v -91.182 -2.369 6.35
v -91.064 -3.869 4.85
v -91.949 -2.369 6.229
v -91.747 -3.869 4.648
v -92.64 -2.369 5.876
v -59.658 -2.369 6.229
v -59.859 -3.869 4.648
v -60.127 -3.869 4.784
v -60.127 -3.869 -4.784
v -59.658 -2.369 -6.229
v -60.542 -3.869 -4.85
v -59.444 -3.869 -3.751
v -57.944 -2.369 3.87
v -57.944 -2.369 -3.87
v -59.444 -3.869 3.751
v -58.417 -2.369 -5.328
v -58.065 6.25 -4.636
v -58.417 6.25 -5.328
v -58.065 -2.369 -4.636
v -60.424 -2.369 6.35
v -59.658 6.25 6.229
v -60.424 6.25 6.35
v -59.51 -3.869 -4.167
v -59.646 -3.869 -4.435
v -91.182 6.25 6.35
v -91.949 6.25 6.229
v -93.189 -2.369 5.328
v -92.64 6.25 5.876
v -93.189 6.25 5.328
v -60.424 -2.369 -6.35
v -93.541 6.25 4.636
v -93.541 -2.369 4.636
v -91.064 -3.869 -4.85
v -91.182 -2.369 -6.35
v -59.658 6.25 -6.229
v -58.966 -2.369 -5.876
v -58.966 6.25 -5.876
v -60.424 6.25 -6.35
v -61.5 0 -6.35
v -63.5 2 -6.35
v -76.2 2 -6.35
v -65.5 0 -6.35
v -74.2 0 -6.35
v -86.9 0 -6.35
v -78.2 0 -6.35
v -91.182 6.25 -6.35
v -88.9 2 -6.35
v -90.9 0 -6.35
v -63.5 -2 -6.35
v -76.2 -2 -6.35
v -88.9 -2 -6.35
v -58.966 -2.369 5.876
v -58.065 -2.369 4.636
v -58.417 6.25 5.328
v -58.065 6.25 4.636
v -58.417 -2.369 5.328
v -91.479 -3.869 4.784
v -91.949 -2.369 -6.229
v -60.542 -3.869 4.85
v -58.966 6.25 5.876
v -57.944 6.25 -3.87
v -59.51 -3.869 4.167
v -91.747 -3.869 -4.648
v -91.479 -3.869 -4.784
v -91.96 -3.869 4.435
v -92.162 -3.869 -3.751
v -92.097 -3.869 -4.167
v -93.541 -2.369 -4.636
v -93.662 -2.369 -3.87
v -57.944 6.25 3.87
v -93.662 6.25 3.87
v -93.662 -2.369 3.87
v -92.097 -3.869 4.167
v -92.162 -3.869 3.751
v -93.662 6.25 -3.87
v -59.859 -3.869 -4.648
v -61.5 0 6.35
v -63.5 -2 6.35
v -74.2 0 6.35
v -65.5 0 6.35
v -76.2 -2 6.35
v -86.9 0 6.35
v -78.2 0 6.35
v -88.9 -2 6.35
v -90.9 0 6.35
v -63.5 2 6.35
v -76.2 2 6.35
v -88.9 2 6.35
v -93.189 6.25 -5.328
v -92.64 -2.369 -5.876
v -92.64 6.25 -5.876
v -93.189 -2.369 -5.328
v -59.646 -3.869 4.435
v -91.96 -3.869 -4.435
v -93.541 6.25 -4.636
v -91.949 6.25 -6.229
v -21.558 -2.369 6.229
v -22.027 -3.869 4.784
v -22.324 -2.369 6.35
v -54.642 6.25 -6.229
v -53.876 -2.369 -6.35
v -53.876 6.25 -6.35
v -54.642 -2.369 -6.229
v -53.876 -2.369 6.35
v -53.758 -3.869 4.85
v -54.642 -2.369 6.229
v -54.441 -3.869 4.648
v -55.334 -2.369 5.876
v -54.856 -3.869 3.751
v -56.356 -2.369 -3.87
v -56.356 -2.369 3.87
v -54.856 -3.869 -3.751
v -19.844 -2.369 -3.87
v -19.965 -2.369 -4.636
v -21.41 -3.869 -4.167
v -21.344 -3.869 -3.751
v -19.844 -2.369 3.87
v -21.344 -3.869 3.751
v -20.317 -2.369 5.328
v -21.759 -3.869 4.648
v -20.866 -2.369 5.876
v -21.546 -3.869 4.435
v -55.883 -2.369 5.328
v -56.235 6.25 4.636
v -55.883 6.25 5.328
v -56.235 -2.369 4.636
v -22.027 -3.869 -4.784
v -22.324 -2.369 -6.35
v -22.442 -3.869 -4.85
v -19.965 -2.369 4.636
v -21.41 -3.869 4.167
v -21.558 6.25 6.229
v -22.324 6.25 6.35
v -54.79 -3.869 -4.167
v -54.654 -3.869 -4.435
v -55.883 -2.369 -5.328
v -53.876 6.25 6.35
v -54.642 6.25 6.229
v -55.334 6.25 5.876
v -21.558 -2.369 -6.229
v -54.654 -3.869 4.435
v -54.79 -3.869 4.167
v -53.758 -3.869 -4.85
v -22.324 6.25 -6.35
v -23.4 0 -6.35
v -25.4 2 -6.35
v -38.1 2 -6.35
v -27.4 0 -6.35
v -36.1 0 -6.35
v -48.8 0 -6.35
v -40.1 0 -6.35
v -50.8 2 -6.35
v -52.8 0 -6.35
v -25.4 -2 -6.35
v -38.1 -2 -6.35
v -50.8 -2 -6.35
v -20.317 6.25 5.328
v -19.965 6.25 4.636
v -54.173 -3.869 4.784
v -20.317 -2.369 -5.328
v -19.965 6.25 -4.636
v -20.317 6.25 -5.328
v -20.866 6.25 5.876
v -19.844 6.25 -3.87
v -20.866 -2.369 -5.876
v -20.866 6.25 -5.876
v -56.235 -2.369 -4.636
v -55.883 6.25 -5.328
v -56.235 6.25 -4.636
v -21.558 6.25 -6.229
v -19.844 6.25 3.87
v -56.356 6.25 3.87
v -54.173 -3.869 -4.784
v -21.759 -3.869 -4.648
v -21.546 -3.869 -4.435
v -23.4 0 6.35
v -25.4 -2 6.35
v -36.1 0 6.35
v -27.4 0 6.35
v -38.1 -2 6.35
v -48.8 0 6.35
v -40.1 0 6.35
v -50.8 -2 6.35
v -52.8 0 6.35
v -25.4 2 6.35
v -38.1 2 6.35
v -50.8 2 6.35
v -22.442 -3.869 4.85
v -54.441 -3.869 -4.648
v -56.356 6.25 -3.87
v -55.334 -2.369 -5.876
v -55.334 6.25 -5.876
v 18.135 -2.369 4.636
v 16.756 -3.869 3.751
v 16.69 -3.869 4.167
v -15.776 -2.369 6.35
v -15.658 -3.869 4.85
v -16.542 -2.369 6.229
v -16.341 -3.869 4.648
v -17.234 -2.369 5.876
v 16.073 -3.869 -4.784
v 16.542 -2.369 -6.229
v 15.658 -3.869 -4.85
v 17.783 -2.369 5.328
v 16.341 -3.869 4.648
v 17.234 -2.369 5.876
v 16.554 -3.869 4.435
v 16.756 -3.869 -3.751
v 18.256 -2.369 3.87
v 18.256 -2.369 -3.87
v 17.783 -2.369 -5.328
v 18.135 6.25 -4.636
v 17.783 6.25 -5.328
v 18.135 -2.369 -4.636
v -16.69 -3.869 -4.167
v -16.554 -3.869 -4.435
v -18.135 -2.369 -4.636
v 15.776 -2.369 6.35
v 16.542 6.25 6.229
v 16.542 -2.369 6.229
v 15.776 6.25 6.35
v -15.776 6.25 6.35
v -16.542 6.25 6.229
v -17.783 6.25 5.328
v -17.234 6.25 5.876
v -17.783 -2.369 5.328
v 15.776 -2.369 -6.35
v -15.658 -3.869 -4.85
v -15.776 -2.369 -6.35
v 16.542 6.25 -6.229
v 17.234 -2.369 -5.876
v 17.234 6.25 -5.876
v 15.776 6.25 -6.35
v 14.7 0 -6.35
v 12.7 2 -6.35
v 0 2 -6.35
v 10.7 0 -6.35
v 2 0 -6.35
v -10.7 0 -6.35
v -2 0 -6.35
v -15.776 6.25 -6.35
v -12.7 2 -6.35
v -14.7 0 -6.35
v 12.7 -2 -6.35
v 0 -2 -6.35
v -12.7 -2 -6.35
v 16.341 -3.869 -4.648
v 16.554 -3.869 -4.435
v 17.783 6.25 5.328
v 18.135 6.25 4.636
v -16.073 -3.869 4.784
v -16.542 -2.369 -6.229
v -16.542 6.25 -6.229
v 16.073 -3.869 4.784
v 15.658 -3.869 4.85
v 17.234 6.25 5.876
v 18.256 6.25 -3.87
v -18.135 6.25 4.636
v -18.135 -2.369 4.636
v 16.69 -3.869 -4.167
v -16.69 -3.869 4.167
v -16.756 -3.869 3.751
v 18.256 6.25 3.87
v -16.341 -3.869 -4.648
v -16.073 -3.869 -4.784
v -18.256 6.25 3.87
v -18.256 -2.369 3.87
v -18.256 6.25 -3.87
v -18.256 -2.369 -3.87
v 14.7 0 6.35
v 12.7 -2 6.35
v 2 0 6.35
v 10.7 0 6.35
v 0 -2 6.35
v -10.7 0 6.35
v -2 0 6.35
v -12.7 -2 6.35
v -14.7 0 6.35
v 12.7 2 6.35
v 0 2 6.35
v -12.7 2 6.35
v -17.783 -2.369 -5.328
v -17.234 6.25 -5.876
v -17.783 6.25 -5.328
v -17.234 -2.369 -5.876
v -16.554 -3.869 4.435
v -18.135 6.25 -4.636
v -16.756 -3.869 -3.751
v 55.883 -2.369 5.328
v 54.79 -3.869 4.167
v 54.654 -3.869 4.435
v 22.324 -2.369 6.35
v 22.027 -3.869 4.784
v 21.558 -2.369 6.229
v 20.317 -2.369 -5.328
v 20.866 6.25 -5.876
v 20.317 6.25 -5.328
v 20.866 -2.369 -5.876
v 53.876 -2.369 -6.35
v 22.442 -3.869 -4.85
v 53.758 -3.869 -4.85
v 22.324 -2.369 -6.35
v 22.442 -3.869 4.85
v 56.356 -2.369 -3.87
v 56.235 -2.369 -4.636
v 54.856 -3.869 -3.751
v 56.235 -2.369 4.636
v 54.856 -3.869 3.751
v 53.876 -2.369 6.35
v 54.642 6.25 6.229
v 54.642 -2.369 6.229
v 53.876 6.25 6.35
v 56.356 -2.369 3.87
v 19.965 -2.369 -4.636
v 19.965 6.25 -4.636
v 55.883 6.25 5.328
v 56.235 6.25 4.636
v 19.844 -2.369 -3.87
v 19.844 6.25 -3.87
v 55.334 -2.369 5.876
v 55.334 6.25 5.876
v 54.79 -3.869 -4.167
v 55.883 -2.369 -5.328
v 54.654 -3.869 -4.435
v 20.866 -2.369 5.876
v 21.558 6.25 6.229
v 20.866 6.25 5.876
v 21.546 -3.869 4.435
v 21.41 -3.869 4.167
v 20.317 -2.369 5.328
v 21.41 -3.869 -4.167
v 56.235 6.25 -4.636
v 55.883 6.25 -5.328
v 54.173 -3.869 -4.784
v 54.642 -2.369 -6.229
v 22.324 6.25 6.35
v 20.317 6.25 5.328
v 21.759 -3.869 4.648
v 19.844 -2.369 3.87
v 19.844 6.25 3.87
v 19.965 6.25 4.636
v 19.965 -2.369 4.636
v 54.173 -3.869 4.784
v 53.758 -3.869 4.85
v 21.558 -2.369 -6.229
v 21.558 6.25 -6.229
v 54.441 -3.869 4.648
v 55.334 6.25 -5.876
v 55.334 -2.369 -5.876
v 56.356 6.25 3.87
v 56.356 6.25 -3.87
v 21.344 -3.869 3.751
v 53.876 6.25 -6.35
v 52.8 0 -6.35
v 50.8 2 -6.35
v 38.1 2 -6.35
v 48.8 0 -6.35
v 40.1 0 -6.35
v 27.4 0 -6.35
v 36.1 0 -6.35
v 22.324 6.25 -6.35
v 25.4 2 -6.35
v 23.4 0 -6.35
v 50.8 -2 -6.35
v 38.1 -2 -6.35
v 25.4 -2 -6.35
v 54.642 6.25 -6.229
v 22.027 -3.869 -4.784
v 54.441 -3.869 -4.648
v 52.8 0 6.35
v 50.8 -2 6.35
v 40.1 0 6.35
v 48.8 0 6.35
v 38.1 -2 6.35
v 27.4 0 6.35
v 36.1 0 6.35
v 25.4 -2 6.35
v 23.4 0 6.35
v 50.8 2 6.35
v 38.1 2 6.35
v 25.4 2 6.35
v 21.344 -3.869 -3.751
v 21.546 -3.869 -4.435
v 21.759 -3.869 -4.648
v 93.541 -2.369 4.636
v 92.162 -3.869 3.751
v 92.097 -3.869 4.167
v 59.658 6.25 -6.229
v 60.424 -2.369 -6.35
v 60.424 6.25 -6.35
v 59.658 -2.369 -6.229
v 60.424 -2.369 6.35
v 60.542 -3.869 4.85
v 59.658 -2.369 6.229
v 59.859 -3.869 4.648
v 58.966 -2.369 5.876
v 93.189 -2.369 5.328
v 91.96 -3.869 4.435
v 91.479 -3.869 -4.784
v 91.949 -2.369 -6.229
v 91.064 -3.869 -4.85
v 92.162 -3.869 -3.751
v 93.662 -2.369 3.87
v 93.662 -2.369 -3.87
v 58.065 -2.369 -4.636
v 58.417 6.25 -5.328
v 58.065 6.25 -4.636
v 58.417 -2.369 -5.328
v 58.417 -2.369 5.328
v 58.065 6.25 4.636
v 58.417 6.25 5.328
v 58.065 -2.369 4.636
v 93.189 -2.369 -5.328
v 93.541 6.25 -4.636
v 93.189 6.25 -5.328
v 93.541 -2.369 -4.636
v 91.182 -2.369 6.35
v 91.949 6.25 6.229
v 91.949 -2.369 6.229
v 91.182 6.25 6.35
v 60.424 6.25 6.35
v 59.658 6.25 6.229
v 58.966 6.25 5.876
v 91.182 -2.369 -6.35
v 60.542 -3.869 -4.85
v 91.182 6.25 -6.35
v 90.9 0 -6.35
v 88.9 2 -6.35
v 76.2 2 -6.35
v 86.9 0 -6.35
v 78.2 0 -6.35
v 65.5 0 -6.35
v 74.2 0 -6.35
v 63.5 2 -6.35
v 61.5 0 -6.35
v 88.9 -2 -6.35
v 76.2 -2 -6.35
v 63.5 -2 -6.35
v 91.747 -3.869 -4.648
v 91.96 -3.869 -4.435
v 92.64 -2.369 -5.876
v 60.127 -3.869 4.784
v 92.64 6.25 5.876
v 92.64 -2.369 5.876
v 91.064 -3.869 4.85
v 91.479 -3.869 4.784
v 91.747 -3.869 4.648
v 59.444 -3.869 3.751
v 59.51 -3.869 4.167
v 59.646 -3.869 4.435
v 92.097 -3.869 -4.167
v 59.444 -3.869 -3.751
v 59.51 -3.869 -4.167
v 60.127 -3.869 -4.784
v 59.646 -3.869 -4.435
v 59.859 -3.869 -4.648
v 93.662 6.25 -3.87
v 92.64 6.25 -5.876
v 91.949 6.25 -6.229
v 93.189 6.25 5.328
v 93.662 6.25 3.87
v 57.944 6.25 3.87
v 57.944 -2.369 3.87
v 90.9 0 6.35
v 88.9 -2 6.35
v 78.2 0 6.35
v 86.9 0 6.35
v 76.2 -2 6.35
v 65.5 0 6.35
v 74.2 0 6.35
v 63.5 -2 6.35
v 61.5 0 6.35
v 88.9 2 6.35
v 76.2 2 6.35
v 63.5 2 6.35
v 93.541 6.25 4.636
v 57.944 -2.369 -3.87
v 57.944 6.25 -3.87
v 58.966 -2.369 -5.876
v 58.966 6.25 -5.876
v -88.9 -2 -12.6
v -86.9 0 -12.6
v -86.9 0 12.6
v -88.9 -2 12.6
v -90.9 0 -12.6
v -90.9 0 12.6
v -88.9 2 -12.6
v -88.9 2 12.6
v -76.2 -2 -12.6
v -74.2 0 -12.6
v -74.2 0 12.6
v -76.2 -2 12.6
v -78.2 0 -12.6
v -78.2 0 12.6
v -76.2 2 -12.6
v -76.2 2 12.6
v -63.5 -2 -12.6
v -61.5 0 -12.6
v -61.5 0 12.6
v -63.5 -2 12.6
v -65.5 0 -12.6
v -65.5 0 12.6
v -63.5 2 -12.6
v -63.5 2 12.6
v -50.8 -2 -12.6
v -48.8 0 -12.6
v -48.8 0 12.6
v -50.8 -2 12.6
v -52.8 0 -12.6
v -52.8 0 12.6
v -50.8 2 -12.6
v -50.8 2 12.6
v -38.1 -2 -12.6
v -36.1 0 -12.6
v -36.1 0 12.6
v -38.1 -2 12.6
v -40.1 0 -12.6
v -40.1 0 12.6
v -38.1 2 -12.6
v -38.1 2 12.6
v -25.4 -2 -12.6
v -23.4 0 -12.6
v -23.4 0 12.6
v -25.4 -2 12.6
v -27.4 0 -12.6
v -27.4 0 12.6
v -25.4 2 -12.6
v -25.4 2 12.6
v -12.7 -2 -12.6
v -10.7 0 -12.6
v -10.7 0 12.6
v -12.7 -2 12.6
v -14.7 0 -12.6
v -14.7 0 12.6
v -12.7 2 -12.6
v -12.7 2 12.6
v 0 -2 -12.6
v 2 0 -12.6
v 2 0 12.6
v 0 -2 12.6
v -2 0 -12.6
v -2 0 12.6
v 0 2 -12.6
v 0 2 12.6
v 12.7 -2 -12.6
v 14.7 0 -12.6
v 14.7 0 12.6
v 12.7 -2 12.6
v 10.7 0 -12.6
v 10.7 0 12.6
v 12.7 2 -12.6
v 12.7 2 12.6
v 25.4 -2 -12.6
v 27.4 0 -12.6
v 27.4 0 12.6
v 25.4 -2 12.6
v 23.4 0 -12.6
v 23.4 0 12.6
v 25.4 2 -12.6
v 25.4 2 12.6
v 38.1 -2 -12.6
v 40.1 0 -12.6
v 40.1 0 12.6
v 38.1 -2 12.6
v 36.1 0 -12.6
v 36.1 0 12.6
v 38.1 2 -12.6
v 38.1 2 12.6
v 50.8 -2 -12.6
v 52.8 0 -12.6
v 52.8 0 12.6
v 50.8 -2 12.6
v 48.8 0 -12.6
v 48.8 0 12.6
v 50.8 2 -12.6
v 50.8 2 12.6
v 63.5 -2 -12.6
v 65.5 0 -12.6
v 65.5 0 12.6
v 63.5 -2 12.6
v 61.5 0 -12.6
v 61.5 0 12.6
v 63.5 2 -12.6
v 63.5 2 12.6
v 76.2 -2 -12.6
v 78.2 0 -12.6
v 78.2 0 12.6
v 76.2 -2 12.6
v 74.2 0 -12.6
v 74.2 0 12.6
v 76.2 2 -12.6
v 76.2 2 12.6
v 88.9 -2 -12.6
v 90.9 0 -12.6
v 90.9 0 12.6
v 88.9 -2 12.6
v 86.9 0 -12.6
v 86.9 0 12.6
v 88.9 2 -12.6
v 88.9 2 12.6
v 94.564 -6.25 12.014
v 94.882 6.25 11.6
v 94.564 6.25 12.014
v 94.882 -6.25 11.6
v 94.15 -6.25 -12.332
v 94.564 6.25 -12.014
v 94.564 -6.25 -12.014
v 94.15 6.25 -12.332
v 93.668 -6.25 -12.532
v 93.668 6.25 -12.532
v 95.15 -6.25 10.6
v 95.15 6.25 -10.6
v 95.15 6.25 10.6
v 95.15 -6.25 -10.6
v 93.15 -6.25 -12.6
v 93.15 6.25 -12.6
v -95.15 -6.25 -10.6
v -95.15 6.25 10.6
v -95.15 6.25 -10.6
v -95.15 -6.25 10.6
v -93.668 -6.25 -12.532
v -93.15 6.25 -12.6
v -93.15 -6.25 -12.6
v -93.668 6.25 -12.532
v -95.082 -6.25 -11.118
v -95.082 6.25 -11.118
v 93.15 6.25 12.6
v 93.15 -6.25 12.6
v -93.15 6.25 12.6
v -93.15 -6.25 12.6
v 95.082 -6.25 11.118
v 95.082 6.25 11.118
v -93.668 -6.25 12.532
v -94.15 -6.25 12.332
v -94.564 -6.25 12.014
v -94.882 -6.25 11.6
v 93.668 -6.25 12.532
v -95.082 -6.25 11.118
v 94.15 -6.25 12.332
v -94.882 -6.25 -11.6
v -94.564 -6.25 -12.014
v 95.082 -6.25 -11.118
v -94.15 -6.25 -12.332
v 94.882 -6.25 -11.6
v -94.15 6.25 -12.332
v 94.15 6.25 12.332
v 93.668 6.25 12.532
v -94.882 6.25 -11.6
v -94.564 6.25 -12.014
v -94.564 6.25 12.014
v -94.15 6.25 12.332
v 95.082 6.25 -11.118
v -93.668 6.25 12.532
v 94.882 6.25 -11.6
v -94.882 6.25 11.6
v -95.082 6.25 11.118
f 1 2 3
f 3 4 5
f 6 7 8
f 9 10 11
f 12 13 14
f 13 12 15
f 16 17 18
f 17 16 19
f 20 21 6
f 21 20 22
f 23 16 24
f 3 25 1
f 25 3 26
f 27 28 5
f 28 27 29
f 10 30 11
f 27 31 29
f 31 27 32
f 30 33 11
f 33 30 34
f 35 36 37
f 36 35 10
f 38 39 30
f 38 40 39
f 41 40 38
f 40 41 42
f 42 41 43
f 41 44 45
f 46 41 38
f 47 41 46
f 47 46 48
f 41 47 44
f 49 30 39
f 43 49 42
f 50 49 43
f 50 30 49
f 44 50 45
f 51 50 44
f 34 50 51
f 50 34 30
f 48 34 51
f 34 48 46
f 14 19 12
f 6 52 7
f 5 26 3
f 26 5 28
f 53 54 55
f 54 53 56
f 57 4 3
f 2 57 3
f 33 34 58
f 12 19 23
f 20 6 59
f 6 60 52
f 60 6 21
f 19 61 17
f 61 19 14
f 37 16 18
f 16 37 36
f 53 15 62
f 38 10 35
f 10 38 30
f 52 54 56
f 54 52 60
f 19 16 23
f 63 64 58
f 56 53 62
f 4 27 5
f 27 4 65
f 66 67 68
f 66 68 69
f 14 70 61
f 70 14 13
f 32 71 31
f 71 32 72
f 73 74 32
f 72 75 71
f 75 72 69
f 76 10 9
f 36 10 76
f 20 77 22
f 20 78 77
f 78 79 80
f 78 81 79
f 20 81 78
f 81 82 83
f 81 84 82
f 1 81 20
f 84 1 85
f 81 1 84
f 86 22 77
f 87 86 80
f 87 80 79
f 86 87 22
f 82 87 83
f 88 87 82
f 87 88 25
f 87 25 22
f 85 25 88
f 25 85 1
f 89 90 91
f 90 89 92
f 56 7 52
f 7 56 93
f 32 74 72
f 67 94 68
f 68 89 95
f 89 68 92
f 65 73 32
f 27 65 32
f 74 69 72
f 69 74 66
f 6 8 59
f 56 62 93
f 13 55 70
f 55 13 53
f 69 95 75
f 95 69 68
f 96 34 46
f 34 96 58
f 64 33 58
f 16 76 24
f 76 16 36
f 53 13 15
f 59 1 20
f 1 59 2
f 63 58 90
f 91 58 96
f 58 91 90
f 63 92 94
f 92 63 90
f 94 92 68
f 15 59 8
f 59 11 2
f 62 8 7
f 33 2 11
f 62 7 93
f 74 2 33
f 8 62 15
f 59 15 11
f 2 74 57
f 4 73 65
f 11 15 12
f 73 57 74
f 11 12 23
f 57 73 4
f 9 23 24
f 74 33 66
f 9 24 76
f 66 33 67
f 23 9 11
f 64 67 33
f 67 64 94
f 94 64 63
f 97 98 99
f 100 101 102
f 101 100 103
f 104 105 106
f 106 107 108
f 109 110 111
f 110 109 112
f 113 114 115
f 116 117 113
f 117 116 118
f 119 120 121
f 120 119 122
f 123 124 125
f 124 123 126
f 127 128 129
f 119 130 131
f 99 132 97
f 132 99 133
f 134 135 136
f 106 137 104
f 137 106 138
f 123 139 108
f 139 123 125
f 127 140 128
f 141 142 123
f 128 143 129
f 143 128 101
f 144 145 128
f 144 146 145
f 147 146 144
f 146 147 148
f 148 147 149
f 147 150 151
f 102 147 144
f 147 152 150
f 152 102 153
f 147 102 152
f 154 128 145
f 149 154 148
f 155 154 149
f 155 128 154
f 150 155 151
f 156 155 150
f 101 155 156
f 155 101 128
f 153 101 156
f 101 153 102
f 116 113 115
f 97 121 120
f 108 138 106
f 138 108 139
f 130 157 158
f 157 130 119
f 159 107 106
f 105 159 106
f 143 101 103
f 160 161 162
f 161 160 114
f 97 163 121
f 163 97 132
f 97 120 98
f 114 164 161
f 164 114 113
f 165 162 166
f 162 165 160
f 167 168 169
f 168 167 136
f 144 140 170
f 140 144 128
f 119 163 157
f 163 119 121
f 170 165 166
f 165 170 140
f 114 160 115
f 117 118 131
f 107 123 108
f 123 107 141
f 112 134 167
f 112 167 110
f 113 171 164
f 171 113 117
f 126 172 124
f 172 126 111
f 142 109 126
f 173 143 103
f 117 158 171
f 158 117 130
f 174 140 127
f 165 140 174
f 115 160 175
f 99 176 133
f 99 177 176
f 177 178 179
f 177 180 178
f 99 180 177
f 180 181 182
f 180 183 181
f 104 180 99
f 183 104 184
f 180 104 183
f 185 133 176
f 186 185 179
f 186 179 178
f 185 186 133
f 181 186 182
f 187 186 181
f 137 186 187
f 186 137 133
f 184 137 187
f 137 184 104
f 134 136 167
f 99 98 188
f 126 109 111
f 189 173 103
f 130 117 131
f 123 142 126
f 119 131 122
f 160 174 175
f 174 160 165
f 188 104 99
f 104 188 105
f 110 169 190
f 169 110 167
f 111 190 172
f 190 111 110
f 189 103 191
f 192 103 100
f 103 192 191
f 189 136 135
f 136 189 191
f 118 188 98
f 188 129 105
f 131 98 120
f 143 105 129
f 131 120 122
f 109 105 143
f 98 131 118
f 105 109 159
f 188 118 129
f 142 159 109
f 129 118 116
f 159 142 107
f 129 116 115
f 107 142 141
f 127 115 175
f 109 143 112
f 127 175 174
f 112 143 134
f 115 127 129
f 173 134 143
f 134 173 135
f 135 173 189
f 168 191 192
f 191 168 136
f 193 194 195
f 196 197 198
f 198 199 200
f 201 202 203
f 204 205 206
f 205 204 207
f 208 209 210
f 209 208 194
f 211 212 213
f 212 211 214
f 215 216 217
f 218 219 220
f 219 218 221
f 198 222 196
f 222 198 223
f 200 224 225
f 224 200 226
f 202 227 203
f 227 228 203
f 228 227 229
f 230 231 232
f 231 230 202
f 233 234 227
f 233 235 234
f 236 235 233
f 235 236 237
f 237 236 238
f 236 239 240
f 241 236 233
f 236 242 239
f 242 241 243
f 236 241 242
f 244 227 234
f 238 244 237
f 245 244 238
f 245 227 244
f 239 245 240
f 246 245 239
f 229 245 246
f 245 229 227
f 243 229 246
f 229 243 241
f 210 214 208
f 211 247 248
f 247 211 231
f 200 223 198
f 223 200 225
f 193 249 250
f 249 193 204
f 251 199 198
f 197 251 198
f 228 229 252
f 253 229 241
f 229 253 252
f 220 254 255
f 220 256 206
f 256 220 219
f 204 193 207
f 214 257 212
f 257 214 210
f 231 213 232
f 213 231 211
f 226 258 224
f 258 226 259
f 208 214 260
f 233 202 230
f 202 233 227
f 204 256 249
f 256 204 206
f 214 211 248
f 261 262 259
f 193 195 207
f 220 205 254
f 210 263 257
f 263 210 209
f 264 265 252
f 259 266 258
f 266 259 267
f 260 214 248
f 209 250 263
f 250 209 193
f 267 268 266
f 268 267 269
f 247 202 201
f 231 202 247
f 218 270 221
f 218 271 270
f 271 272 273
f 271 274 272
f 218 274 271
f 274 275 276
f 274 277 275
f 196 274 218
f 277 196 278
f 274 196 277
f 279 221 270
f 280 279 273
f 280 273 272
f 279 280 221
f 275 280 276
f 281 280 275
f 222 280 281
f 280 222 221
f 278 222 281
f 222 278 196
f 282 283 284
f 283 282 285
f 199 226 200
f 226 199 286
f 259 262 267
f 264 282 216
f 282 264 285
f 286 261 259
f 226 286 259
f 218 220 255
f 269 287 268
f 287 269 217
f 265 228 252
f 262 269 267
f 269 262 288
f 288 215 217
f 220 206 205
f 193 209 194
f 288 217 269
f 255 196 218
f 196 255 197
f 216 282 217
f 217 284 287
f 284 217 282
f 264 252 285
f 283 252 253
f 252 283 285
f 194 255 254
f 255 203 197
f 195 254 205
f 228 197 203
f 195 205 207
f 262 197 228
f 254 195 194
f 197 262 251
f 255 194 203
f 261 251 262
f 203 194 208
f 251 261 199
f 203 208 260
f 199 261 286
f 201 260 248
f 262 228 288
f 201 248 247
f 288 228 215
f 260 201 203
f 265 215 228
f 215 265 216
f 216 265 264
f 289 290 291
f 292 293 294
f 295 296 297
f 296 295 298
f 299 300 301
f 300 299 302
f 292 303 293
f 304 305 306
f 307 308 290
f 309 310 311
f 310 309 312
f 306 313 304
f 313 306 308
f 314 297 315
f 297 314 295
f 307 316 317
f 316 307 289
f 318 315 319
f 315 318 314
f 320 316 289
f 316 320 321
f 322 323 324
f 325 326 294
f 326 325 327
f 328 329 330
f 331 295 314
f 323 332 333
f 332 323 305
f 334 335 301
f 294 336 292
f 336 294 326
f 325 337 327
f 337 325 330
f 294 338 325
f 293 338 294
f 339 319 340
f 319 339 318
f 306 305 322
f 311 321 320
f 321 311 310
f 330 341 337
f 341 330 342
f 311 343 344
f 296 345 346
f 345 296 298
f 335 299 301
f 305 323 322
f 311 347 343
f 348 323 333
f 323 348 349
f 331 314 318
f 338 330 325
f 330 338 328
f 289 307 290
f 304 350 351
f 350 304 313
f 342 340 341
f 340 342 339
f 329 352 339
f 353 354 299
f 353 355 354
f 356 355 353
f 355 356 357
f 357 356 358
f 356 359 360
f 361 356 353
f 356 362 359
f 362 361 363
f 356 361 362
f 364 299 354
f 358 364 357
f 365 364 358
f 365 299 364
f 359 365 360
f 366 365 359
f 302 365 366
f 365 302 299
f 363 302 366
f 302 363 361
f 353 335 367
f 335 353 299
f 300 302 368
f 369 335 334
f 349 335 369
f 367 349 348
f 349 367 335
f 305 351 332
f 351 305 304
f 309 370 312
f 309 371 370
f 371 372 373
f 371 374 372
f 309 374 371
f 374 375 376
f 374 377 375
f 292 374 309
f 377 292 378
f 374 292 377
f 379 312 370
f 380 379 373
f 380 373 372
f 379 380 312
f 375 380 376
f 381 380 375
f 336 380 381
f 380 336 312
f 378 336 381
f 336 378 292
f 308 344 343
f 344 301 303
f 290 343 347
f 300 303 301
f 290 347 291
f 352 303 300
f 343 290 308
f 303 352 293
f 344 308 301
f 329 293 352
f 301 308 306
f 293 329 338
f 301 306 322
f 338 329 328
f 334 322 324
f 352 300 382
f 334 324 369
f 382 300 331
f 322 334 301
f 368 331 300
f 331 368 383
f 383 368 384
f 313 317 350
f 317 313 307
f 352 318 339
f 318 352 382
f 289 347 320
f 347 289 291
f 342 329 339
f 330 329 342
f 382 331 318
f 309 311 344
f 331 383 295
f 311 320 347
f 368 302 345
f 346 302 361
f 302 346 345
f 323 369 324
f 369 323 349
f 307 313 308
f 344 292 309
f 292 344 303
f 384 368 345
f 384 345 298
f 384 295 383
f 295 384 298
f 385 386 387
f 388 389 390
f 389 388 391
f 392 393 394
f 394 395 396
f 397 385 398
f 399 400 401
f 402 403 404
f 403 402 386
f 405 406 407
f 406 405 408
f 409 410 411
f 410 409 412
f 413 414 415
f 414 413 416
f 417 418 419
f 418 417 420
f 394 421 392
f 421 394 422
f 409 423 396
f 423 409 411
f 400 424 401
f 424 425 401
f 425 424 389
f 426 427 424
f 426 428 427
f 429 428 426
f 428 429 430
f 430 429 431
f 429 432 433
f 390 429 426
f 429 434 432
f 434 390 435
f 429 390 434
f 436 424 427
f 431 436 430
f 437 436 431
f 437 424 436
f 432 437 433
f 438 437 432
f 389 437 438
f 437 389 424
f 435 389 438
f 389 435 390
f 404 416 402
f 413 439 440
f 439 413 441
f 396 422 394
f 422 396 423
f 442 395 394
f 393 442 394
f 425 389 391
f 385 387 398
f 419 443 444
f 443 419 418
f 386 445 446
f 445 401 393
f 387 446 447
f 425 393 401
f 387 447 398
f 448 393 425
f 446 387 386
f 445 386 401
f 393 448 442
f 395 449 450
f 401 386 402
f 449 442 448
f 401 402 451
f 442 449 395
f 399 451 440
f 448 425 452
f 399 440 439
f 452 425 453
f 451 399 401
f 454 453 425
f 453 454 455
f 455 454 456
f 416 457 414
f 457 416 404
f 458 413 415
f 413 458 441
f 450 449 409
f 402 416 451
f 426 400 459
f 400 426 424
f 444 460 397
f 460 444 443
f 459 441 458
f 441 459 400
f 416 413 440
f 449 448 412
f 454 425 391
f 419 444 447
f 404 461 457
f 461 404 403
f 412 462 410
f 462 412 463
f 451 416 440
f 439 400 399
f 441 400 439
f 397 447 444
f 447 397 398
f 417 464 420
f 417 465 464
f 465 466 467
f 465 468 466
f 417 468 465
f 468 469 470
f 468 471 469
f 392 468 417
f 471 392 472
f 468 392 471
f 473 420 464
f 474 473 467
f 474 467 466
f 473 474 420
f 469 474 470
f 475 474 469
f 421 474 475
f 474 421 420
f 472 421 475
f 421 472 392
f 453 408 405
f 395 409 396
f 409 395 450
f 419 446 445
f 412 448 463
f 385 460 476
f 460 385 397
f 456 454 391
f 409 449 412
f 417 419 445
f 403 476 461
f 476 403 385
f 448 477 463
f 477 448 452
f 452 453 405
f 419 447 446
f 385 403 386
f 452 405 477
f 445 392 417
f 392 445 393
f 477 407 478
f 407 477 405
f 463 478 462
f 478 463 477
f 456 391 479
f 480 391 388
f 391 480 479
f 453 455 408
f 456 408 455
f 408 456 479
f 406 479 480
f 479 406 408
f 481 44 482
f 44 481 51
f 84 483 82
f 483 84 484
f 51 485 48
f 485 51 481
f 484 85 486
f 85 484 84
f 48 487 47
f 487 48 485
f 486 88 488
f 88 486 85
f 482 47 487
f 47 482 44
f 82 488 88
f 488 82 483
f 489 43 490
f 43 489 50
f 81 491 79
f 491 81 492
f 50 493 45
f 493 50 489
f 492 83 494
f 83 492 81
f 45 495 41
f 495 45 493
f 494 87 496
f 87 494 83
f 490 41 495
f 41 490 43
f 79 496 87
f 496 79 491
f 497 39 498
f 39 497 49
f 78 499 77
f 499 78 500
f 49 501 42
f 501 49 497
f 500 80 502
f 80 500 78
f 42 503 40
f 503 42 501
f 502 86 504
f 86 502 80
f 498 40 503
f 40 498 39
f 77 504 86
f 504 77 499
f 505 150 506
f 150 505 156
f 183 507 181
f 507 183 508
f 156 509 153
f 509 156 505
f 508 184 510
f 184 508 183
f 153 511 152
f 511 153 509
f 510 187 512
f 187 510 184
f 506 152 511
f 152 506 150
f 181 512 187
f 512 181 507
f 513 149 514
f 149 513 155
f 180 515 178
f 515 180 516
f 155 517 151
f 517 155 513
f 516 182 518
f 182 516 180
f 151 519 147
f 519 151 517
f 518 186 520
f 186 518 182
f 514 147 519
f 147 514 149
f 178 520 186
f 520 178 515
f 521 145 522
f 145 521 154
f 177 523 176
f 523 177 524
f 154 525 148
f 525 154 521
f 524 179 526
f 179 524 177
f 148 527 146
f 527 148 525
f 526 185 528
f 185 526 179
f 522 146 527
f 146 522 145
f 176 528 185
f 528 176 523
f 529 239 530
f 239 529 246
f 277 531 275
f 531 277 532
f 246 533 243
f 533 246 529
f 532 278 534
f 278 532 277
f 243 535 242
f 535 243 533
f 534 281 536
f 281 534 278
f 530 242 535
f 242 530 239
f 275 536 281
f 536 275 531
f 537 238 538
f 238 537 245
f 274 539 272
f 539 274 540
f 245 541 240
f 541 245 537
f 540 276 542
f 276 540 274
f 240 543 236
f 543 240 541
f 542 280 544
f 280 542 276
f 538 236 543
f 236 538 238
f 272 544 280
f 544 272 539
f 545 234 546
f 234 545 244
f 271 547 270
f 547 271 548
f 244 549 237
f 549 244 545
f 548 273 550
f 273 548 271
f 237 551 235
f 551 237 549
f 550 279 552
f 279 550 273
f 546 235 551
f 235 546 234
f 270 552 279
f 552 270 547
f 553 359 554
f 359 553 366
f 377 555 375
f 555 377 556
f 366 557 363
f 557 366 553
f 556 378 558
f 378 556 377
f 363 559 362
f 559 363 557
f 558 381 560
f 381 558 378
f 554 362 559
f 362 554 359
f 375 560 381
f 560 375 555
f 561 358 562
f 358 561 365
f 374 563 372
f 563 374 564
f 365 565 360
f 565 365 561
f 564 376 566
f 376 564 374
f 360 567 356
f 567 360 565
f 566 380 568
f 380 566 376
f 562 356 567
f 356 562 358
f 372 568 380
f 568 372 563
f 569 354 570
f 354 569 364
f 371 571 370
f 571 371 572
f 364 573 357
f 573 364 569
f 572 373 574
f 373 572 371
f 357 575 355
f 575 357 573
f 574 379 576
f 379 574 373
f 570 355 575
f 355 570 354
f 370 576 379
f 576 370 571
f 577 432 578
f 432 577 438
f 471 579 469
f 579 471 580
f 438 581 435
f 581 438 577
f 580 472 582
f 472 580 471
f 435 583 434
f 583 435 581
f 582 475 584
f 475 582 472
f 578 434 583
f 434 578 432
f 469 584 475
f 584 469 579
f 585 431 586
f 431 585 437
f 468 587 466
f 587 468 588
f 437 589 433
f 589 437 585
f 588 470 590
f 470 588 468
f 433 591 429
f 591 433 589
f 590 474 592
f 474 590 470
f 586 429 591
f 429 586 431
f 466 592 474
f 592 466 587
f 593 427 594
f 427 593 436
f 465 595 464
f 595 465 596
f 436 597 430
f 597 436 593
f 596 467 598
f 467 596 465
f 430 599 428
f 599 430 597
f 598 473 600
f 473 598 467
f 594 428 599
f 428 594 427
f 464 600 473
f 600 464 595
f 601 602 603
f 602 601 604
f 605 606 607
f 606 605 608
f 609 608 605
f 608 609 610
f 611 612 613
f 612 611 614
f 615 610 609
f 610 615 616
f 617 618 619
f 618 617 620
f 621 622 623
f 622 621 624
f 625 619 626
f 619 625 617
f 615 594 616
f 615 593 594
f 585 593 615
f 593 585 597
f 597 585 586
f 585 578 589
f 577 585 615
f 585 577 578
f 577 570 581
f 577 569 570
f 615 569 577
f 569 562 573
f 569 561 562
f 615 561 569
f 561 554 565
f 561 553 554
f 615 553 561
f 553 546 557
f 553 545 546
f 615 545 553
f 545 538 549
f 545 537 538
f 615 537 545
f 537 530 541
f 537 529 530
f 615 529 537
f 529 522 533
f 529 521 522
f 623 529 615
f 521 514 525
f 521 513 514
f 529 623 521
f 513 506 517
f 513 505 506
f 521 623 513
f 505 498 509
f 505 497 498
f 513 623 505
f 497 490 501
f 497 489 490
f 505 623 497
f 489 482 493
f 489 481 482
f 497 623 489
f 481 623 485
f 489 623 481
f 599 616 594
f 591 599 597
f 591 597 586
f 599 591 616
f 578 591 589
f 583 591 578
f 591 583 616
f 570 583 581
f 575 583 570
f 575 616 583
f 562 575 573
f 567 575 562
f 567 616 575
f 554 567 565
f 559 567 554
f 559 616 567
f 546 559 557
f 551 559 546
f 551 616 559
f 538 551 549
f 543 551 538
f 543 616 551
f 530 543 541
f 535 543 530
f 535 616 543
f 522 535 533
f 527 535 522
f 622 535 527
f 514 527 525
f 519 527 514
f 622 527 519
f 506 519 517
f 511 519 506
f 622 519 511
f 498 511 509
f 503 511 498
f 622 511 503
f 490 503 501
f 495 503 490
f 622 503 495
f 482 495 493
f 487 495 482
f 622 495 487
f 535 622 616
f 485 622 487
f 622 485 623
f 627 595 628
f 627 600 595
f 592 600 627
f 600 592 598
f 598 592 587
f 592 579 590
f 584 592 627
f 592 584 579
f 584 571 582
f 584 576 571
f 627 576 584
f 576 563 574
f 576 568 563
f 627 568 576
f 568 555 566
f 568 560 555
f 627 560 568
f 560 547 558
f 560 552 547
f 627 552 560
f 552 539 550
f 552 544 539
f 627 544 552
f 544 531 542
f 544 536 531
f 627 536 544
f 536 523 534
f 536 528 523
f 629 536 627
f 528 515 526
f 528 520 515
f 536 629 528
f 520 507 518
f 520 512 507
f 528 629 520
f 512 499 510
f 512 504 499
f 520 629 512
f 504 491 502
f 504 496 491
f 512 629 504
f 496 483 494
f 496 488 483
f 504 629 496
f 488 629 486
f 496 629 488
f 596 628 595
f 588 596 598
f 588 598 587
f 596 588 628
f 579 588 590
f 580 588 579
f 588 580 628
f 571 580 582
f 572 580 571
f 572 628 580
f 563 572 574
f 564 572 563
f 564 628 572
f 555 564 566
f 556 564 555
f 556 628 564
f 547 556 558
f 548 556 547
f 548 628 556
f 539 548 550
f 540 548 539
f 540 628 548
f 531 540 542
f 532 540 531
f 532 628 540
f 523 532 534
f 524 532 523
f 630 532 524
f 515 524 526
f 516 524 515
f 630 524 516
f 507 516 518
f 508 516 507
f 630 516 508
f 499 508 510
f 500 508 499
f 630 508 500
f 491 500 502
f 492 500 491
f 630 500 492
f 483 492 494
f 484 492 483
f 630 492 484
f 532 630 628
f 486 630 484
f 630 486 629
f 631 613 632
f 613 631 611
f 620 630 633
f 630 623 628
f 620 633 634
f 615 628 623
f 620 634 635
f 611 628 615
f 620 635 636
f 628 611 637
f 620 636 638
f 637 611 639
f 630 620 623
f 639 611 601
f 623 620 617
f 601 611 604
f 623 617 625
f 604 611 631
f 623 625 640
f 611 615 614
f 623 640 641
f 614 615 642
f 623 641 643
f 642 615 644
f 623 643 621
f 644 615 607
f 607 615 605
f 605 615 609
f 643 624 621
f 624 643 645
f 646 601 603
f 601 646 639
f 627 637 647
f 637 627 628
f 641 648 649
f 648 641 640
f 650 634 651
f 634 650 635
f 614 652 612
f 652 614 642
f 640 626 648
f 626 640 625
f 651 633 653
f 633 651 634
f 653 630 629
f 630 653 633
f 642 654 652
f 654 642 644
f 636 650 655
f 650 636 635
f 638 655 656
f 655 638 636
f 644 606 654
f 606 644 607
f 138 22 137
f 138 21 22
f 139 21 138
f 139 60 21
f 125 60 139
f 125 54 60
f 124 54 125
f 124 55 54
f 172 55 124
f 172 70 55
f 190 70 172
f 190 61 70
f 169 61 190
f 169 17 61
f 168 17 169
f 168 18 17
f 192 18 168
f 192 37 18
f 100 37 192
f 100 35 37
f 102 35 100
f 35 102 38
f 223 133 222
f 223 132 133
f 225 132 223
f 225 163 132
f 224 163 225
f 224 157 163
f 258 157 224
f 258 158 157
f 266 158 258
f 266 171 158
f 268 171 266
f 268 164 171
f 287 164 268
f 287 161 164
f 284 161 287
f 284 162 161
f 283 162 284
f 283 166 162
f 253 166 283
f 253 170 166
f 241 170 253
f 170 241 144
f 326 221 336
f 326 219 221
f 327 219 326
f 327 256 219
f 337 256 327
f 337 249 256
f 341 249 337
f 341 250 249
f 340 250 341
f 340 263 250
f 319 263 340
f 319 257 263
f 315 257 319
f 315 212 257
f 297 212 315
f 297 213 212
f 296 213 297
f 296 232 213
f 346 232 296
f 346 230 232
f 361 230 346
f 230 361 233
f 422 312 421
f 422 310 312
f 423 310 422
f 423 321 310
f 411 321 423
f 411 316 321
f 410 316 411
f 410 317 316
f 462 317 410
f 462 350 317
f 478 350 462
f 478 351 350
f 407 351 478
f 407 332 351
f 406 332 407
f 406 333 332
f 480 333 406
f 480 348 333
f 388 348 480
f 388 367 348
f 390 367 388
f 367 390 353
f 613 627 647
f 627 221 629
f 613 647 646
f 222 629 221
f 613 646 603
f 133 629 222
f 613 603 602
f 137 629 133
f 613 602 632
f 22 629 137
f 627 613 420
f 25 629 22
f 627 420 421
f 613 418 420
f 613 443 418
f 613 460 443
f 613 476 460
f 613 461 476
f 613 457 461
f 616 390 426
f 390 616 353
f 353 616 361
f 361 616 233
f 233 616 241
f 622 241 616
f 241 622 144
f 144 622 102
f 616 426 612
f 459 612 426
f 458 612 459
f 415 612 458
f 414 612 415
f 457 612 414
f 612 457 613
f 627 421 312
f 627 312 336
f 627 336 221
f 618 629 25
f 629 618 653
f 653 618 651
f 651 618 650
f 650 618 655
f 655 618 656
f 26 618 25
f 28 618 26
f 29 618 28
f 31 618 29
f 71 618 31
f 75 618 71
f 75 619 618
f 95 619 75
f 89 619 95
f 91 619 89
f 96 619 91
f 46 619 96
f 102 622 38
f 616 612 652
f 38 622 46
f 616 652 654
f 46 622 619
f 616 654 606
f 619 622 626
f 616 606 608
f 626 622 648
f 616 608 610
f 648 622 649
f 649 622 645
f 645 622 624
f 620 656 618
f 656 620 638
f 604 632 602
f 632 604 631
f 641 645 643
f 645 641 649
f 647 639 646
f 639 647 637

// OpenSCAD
// HollowRail0.3
// 
// v0.2
// - Skip generating cavity when appropriate
// - Make diamond holes a little smaller, 4mm instead of 4.5mm
// v0.3:
// - back_y, front_y now configurable, so you can make narrower (or thicker) rails
// - Multiple rounded cutouts instead of one big sharp-cornered one

length = "15atom";
height = "1inch";
// Offset to apply to outer surfaces, usually a small negative value to provide 'wiggle room'
$tgx11_offset = -0.1;
back_y = "-1/4inch";
front_y = "1/4inch";
top_thickness = "1/4inch";
bottom_thickness = "1/4inch";
back_thickness = "3/32inch";
end_thickness = "1u";
$fn = 24;

module hollowrail0__end_params() { }

use <../lib/TOGMod1.scad>
use <../lib/TOGMod1Constructors.scad>
use <../lib/TOGPath1.scad>
use <../lib/TOGPolyhedronLib1.scad>
use <../lib/TOGUnits1.scad>

length_atoms = togunits1_decode(length, [1, "atom"]);
length_mm = togunits1_to_mm(length);
height_mm = togunits1_to_mm(height);
back_thickness_mm  = togunits1_to_mm(back_thickness);
top_thickness_mm  = togunits1_to_mm(top_thickness);
bottom_thickness_mm  = togunits1_to_mm(bottom_thickness);
end_thickness_mm  = togunits1_to_mm(end_thickness);
atom_mm = togunits1_to_mm([1, "atom"]);
back_y_mm  = togunits1_to_mm(back_y);
front_y_mm = togunits1_to_mm(front_y);

length_chunks = round(length_atoms/3);

hole = togmod1_linear_extrude_z([-height_mm, height_mm], togmod1_make_circle(d=4, $fn=4));

togmod1_domodule(["difference",
	togmod1_linear_extrude_y([back_y_mm-$tgx11_offset, front_y_mm+$tgx11_offset], togmod1_make_rounded_rect([length_mm+$tgx11_offset*2, height_mm+$tgx11_offset*2], r=2)),
	
	// 'hollow' bits
	if( back_thickness_mm < (front_y_mm-back_y_mm) && height_mm - top_thickness_mm - bottom_thickness_mm > 0 )
	for( xm=[-length_atoms/2 + 1.5 : 3 : length_atoms/2+1.5] )
	let( cx0 = max(-length_mm/2 + end_thickness_mm, (xm-1.5)*atom_mm + end_thickness_mm/2) )
	let( cx1 = min( length_mm/2 - end_thickness_mm, (xm+1.5)*atom_mm - end_thickness_mm/2) )
	if( cx1 > cx0 )
	let( cy0 = back_y_mm - $tgx11_offset + back_thickness_mm, cy1 = max(cy0+10, front_y_mm + $tgx11_offset + 1) )
	echo( cy0=cy0, cy1=cy1 )
	let( cz0 = -height_mm/2 + bottom_thickness_mm, cz1 = height_mm/2 - top_thickness_mm )
	let( corner_r = min(5, cx1-cx0, cz1-cz0)*127/256 )
	let( korner_r = min(corner_r, 1.5) )
	["rotate", [-90,0,0], tphl1_make_polyhedron_from_layer_function(
		[
			[cy0         ,-korner_r],
			[cy0+korner_r, 0       ],
			[cy1         , 0       ],
		],
		function(yo)
		   togpath1_rath_to_polypoints(["togpath1-rath",
				// Note that winding order looks backwards when extruding along Y
				["togpath1-rathnode", [cx1,cz0], ["round", corner_r], ["offset", yo[1]]],
				["togpath1-rathnode", [cx1,cz1], ["round", corner_r], ["offset", yo[1]]],
				["togpath1-rathnode", [cx0,cz1], ["round", corner_r], ["offset", yo[1]]],
				["togpath1-rathnode", [cx0,cz0], ["round", corner_r], ["offset", yo[1]]],
			]),
		layer_points_transform = "key0-to-z"
	)],
	/*
	// Old cavity generation as used by p2175
	togmod1_linear_extrude_x([-length_mm/2+end_thickness_mm, length_mm/2-end_thickness_mm], togmod1_make_polygon(
		let(y0 = back_y_mm - $tgx11_offset + back_thickness_mm, y1 = front_y_mm + $tgx11_offset + 1)
		let(z0 = -height_mm/2 + bottom_thickness_mm, z1 = height_mm/2 - top_thickness_mm)
		[
			[y0  , z0+1],
			[y0+1, z0  ],
			[y1  , z0  ],
			[y1  , z1  ],
			[y0+1, z1  ],
			[y0  , z1-1],
		] // Maybe this should be rounded, too, but WHATEVER
	)),
	*/
	
	for( xm=[-length_atoms/2+0.5 : 1 : length_atoms/2-0.4] ) ["translate", [xm*atom_mm, 0, 0], hole],
]);
